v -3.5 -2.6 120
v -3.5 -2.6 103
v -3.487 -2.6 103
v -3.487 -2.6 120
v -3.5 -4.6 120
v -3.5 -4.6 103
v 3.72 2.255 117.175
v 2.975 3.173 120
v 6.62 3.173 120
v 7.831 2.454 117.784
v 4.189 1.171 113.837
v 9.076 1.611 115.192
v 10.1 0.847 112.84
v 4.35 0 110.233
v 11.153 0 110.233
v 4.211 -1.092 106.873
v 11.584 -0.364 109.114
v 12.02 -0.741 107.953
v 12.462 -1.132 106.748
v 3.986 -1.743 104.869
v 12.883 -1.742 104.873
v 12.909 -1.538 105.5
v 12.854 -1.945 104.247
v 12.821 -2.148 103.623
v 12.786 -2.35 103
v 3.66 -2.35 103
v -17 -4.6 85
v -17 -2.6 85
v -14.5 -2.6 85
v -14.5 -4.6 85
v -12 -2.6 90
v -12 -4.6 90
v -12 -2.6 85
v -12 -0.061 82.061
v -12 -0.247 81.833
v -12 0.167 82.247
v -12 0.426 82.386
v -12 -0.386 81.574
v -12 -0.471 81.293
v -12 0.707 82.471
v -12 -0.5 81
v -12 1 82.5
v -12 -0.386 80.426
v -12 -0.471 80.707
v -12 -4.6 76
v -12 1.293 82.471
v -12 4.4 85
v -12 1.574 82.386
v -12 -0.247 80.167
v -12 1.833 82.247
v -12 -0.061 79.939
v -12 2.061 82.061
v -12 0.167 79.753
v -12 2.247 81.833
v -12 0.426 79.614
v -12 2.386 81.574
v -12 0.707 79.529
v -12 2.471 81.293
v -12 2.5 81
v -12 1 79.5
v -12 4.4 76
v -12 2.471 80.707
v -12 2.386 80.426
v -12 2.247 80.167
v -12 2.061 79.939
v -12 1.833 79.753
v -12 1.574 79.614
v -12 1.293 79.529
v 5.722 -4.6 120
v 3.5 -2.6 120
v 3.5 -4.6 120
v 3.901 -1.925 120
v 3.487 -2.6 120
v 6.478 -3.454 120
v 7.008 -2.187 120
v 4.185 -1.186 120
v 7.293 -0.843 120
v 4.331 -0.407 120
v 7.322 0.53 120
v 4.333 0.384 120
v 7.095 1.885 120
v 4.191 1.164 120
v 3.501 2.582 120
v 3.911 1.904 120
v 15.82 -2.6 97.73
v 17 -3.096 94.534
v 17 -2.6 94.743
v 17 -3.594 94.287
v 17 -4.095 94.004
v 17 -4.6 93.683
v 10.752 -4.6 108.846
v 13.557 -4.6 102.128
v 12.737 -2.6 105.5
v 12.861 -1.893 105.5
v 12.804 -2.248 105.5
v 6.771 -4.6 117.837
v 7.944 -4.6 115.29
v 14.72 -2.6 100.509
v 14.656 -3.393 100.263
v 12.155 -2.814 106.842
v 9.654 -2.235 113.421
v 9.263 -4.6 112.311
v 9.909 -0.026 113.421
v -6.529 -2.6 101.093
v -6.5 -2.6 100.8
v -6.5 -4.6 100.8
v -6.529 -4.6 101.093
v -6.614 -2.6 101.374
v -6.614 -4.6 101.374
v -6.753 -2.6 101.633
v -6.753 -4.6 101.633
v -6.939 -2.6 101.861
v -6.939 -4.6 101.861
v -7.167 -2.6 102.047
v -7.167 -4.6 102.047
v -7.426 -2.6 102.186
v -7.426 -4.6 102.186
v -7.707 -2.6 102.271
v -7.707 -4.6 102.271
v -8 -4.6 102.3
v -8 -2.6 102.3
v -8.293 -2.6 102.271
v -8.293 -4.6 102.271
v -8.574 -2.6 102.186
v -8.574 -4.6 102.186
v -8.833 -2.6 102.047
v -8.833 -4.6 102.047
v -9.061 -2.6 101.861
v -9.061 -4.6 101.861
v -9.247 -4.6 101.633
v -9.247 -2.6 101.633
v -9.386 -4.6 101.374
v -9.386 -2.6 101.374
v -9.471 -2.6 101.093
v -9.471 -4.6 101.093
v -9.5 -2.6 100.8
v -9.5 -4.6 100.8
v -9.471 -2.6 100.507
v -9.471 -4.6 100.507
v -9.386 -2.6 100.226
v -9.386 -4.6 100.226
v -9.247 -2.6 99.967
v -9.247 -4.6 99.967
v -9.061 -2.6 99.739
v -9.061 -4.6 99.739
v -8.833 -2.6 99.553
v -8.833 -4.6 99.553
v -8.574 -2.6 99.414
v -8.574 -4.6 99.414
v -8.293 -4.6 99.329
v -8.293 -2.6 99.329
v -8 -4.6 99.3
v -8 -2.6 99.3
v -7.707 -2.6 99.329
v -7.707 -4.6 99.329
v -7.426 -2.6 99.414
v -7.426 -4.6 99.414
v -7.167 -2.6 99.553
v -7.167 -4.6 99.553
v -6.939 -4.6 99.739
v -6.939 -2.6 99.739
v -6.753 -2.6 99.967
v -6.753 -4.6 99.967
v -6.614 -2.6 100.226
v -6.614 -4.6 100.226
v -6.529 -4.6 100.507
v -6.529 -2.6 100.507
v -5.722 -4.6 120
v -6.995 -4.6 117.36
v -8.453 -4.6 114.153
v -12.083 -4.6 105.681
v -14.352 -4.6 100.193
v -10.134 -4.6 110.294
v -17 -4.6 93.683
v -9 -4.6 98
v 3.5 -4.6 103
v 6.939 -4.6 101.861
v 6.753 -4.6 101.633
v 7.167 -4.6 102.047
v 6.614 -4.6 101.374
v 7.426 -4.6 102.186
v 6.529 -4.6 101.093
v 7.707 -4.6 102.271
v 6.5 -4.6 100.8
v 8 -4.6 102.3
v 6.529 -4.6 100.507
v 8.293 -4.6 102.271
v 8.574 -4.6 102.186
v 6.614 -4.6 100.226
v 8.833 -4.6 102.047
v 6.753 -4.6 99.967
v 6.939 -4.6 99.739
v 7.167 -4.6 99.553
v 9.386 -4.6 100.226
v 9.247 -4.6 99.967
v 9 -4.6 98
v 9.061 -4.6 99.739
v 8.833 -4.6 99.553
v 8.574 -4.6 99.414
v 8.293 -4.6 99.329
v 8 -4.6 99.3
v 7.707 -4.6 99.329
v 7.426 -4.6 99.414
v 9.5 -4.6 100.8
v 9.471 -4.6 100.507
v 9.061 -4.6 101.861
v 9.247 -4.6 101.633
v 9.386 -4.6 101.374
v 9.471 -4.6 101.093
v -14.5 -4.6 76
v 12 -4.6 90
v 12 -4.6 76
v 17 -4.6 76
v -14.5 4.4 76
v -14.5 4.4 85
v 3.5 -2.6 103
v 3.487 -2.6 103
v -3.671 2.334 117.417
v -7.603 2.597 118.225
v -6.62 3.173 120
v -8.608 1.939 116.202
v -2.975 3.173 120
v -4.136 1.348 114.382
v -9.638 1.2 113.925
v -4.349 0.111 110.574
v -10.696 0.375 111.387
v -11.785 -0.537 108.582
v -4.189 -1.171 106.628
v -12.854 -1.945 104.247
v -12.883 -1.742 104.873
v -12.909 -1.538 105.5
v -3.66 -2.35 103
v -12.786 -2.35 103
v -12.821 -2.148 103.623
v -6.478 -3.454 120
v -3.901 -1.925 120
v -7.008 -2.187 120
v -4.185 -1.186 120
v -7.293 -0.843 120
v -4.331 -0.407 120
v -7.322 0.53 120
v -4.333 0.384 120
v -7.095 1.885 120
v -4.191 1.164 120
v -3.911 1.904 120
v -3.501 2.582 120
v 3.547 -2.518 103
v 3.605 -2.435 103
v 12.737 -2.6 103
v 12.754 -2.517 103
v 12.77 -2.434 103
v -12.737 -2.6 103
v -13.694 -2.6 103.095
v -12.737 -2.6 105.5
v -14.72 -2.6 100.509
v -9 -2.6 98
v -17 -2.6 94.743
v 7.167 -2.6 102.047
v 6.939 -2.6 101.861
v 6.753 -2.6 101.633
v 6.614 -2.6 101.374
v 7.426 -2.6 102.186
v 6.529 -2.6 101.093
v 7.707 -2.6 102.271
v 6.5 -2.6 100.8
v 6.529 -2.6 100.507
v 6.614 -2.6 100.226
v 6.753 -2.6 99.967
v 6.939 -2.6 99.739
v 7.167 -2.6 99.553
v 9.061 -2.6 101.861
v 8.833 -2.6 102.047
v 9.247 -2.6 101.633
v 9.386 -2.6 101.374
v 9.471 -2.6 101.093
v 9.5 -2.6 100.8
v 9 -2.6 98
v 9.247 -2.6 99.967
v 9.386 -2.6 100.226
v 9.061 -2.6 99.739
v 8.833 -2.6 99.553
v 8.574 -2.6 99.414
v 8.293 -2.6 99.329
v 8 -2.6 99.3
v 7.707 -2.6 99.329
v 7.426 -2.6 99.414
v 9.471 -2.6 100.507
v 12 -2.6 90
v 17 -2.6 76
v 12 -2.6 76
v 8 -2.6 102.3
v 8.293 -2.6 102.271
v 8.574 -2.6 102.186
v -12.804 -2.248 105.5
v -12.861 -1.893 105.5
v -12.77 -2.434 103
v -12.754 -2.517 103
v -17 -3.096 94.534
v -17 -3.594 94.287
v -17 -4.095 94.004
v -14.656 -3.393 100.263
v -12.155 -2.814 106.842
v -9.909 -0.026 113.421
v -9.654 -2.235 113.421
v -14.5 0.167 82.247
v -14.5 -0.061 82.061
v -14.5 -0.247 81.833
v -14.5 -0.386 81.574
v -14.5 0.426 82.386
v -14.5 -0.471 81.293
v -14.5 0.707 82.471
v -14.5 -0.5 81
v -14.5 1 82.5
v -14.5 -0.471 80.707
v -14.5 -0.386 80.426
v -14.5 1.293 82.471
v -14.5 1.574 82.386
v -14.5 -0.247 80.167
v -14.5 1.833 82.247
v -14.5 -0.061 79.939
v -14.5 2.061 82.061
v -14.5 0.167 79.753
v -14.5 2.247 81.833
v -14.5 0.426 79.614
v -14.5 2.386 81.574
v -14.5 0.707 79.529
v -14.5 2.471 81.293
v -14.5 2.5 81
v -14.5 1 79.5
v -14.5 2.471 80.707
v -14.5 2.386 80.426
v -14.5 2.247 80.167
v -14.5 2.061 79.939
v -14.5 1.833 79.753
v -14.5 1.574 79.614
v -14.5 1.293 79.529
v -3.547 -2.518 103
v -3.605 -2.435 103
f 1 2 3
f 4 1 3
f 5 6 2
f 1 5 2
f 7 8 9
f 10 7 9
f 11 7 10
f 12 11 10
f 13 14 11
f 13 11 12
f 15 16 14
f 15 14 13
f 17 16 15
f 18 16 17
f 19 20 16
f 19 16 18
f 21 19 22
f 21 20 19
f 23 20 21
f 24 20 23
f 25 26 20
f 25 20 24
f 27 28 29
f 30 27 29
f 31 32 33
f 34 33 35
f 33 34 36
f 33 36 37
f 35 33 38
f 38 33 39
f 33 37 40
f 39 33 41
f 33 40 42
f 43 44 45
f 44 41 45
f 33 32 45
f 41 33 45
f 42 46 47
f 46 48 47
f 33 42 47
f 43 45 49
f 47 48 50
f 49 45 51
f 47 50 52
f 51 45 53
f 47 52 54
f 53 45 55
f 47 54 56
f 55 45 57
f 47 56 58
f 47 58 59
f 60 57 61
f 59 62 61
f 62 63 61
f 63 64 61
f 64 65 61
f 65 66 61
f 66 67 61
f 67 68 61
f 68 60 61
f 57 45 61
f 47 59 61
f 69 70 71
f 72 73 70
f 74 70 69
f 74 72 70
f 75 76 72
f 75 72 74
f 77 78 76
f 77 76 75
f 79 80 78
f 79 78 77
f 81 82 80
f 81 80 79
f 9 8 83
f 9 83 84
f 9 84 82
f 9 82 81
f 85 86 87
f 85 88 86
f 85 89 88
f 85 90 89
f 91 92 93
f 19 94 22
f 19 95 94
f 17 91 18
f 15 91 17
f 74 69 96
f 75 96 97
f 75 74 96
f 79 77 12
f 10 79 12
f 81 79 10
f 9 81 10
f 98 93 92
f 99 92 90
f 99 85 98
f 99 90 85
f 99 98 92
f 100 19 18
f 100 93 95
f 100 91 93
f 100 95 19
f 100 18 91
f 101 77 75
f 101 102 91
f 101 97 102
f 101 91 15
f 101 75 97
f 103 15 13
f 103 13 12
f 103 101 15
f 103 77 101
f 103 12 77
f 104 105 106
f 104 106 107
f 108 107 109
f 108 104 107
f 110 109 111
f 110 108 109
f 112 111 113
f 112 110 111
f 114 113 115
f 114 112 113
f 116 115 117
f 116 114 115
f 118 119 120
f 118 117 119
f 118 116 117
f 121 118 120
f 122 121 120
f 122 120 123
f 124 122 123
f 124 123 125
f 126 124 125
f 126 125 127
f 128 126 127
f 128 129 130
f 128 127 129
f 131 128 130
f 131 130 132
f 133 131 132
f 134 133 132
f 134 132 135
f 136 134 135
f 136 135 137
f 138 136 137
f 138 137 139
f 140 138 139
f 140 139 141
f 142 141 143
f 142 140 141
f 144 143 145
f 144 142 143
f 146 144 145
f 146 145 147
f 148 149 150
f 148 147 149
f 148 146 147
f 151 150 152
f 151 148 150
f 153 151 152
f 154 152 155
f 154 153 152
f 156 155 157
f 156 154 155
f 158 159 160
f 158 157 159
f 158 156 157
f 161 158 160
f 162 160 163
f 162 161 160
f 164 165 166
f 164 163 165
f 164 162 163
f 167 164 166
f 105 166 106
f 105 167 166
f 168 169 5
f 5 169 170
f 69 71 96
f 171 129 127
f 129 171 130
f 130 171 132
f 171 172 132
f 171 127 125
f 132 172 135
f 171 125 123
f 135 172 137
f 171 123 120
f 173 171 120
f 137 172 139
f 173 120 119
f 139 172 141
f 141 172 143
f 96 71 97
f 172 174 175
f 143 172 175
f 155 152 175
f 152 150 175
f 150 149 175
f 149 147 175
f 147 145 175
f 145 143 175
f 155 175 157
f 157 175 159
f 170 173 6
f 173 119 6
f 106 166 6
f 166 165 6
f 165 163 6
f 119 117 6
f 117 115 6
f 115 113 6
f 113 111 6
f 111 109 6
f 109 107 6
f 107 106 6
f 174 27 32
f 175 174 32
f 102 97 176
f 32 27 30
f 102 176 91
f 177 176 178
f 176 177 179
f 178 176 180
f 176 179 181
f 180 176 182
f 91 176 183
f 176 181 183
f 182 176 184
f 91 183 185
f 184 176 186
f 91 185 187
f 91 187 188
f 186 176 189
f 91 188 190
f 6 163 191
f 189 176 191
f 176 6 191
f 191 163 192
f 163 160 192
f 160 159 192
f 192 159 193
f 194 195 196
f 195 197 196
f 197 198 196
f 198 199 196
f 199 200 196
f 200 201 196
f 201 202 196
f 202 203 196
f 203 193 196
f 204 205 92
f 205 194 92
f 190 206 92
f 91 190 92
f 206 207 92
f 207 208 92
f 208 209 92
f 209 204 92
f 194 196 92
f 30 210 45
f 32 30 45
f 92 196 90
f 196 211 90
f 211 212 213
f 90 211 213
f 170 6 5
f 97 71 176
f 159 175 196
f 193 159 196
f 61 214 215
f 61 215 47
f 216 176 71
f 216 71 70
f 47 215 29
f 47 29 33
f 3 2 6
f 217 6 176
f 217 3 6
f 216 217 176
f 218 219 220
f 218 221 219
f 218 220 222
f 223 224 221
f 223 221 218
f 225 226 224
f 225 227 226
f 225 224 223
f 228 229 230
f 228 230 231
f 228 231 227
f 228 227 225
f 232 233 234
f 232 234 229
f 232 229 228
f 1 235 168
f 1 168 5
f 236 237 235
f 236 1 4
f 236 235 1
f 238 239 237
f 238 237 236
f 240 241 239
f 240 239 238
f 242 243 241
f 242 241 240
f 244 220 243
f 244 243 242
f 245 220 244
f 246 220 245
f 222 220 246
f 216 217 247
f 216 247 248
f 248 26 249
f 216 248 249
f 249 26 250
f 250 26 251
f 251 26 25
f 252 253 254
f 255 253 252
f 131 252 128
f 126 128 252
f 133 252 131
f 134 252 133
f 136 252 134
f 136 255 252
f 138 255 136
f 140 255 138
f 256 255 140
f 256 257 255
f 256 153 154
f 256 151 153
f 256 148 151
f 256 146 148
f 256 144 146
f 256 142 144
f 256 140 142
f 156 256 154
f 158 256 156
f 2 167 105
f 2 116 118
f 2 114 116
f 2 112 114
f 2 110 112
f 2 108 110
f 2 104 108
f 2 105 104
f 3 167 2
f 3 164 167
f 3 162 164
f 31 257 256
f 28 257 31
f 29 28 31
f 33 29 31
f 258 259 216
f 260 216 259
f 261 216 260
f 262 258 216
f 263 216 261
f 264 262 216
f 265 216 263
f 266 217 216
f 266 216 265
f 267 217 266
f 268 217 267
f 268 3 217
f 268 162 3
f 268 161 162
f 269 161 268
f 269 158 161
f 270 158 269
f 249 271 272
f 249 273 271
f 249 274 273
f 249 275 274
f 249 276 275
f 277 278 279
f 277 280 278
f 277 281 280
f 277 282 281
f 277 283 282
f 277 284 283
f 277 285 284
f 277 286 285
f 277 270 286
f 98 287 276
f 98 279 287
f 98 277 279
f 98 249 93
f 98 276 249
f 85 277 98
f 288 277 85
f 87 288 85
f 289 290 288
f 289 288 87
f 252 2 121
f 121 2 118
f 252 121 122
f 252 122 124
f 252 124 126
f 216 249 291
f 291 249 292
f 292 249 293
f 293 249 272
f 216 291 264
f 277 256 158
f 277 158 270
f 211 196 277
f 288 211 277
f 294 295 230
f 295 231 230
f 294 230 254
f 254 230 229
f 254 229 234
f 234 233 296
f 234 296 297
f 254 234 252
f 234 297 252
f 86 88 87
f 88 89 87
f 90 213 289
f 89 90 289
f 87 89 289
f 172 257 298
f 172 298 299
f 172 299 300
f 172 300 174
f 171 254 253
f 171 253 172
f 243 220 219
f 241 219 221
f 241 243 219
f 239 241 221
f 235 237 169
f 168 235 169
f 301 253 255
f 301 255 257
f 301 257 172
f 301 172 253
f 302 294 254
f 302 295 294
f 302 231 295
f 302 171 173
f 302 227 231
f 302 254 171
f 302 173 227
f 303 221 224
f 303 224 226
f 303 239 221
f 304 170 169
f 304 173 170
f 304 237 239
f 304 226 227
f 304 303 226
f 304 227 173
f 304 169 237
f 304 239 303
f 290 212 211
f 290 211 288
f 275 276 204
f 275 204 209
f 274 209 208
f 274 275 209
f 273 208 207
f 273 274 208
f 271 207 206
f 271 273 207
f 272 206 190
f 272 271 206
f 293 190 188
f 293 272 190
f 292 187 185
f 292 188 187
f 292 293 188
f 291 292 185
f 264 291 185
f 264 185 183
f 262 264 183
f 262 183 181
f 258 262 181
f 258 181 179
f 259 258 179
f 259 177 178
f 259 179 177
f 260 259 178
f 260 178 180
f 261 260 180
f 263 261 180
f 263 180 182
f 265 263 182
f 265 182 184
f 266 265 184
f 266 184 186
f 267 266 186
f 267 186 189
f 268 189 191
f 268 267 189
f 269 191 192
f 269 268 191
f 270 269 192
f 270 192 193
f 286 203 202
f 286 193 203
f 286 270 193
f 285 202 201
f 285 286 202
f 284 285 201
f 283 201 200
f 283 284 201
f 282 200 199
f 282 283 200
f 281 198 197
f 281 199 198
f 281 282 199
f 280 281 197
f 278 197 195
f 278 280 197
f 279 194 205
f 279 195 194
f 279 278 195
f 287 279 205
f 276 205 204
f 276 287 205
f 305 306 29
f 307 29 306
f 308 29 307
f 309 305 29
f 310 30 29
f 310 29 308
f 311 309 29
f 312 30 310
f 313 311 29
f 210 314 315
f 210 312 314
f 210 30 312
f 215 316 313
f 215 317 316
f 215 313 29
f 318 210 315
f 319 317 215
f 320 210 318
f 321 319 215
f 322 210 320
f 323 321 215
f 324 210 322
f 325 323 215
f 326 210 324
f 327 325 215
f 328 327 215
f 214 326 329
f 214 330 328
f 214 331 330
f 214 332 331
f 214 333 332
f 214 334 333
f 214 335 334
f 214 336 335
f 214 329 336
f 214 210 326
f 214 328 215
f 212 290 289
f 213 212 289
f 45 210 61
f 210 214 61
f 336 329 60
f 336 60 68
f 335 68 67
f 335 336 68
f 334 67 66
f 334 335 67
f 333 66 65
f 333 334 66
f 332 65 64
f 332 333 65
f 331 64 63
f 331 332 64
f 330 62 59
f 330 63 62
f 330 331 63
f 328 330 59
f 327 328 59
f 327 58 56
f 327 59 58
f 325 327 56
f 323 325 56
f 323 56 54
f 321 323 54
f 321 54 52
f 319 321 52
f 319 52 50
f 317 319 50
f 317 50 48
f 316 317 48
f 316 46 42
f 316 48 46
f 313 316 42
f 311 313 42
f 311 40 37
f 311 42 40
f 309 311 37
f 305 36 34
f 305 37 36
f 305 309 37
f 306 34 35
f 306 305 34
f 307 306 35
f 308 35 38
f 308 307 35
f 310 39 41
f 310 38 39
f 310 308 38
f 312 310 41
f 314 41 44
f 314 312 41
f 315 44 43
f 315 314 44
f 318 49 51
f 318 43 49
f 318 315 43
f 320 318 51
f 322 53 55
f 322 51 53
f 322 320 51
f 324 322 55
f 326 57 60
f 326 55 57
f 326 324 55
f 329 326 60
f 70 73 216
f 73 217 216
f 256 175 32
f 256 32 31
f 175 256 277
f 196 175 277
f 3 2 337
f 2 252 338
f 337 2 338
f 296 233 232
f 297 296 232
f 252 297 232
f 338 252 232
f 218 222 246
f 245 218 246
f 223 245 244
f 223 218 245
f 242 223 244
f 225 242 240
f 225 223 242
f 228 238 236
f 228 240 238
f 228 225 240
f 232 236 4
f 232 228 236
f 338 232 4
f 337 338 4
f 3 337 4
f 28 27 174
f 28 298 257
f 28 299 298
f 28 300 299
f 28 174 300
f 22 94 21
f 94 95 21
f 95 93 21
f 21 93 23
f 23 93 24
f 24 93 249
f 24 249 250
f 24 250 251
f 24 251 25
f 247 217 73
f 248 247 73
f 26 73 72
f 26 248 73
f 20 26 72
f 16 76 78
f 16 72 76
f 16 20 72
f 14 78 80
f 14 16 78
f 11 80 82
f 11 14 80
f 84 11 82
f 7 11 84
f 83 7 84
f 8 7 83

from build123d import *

# Parameters (mm, degrees)
CYLINDER399_R          = 21
CYLINDER399_DEPTH      = 9
BOX330_W               = 26
BOX330_H               = 12
BOX330_DEPTH           = 20
BOX331_W               = 26
BOX331_H               = 15
BOX331_DEPTH           = 25
BOX331_PLACEMENT_ANGLE = 18
CYLINDER407_R          = 4.35
CYLINDER407_DEPTH      = 17
CYLINDER406_R          = 13
CYLINDER406_DEPTH      = 17
CYLINDER403_R          = 1.5
CYLINDER403_DEPTH      = 10
BOX329_W               = 2.5
BOX329_H               = 9
BOX329_DEPTH           = 9
BOX317_W               = 7
BOX317_H               = 2
BOX317_DEPTH           = 17
CYLINDER401_R          = 1.5
CYLINDER401_DEPTH      = 5
CYLINDER397_R          = 1.5
CYLINDER397_DEPTH      = 5
BOX316_W               = 3
BOX316_H               = 2
BOX316_DEPTH           = 9
BOX322_W               = 24
BOX322_H               = 6
BOX322_DEPTH           = 22
CHAMFER_1_SIZE2        = 3
CHAMFER_1_SIZE         = 8
CHAMFER_2_SIZE2        = 3
CHAMFER_2_SIZE         = 8
BOX324_W               = 34
BOX324_H               = 2
BOX324_DEPTH           = 44


with BuildPart() as cone005:
    # Cone004 → Cone004 (revolve)
    with BuildSketch(Plane(origin=(0, 0, 85), x_dir=(1, 0, 0), z_dir=(0, -1, 0))):
        Polygon((0, 0), (21, 0), (5, 41), (0, 41), align=None)
    revolve(axis=Axis((0, 0, 85), (0, 0, 1)))


with BuildPart() as fusion077:
    # Cylinder399 → Cylinder399 (new body)
    with BuildSketch(Plane.XY.offset(76)):
        Circle(CYLINDER399_R)
    extrude(amount=CYLINDER399_DEPTH)

    # Fusion077: union Cone005
    add(cone005.part)


with BuildPart() as cube306:
    # Box330 → Box330 (new body)
    with BuildSketch(Plane(origin=(-13, -14.6, 101), x_dir=(1, 0, 0), z_dir=(0, 0, 1))):
        with Locations((13, 6)):
            Rectangle(BOX330_W, BOX330_H)
    extrude(amount=BOX330_DEPTH)


with BuildPart() as cube307:
    # Box331 → Box331 (new body)
    with BuildSketch(Plane.XY):
        with Locations((13, 7.5)):
            Rectangle(BOX331_W, BOX331_H)
    extrude(amount=BOX331_DEPTH)


with BuildPart() as cube307_1:
    # Box331 placement: moved
    add(cube307.part.moved(Location((-13, -3, 101))).rotate(Axis((-13, -3, 101), (-1, 0, 0)), BOX331_PLACEMENT_ANGLE))


with BuildPart() as cylinder407:
    # Cylinder407 → Cylinder407 (new body)
    with BuildSketch(Plane.XY.offset(103)):
        Circle(CYLINDER407_R)
    extrude(amount=CYLINDER407_DEPTH)


with BuildPart() as antenna_support_carrier:
    # Cylinder406 → Cylinder406 (new body)
    with BuildSketch(Plane.XY.offset(103)):
        Circle(CYLINDER406_R)
    extrude(amount=CYLINDER406_DEPTH)

    # Cut220: cut Cylinder407
    add(cylinder407.part, mode=Mode.SUBTRACT)

    # Cut221: cut Cube307
    add(cube307_1.part, mode=Mode.SUBTRACT)

    # Cut216: cut Cube306
    add(cube306.part, mode=Mode.SUBTRACT)


with BuildPart() as cylinder403:
    # Cylinder403 → Cylinder403 (new body)
    with BuildSketch(Plane(origin=(-20, 1, 72), x_dir=(0, 0, -1), z_dir=(1, 0, 0))):
        Circle(CYLINDER403_R)
    extrude(amount=CYLINDER403_DEPTH)


with BuildPart() as cut223:
    # Box329 → Box329 (new body)
    with BuildSketch(Plane(origin=(-14.5, -4.6, 67), x_dir=(1, 0, 0), z_dir=(0, 0, 1))):
        with Locations((1.25, 4.5)):
            Rectangle(BOX329_W, BOX329_H)
    extrude(amount=BOX329_DEPTH)

    # Cut223: cut Cylinder403
    add(cylinder403.part, mode=Mode.SUBTRACT)


with BuildPart() as cut223_1:
    # Cut223 placement: moved
    add(cut223.part.moved(Location((0, 0, 9))))


with BuildPart() as cube293:
    # Box317 → Box317 (new body)
    with BuildSketch(Plane(origin=(-3.5, -4.6, 103), x_dir=(1, 0, 0), z_dir=(0, 0, 1))):
        with Locations((3.5, 1)):
            Rectangle(BOX317_W, BOX317_H)
    extrude(amount=BOX317_DEPTH)


with BuildPart() as cylinder401:
    # Cylinder401 → Cylinder401 (new body)
    with BuildSketch(Plane(origin=(-8, 0, 100.8), x_dir=(1, 0, 0), z_dir=(0, -1, 0))):
        Circle(CYLINDER401_R)
    extrude(amount=CYLINDER401_DEPTH)


with BuildPart() as screwholes002:
    # Cylinder397 → Cylinder397 (new body)
    with BuildSketch(Plane(origin=(8, 0, 100.8), x_dir=(1, 0, 0), z_dir=(0, -1, 0))):
        Circle(CYLINDER397_R)
    extrude(amount=CYLINDER397_DEPTH)

    # Compound200: union Cylinder401
    add(cylinder401.part)


with BuildPart() as cube292:
    # Box316 → Box316 (new body)
    with BuildSketch(Plane(origin=(-17.5, -4.6, 76), x_dir=(1, 0, 0), z_dir=(0, 0, 1))):
        with Locations((1.5, 1)):
            Rectangle(BOX316_W, BOX316_H)
    extrude(amount=BOX316_DEPTH)


with BuildPart() as cut_outs001:
    # Box322 → Box322 (new body)
    with BuildSketch(Plane(origin=(-12, -4.6, 76), x_dir=(1, 0, 0), z_dir=(0, 0, 1))):
        with Locations((12, 3)):
            Rectangle(BOX322_W, BOX322_H)
    extrude(amount=BOX322_DEPTH)

    # Chamfer 1
    chamfer_1_edges = [cut_outs001.edges().sort_by_distance(p)[0] for p in [
        (12, -1.6, 98),
    ]]
    chamfer_1_side = cut_outs001.faces().sort_by_distance((12, -1.6, 87))[0]
    chamfer(chamfer_1_edges, length=CHAMFER_1_SIZE, length2=CHAMFER_1_SIZE2, reference=chamfer_1_side)

    # Chamfer 2
    chamfer_2_edges = [cut_outs001.edges().sort_by_distance(p)[0] for p in [
        (-12, -1.6, 98),
    ]]
    chamfer_2_side = cut_outs001.faces().sort_by_distance((-12, -1.6, 87))[0]
    chamfer(chamfer_2_edges, length=CHAMFER_2_SIZE, length2=CHAMFER_2_SIZE2, reference=chamfer_2_side)

    # Fusion085: union Cube293, Screwholes002, Cube292
    add(cube293.part)
    add(screwholes002.part)
    add(cube292.part)


with BuildPart() as support_mpu6050:
    # Box324 → Box324 (new body)
    with BuildSketch(Plane(origin=(-17, -4.6, 76), x_dir=(1, 0, 0), z_dir=(0, 0, 1))):
        with Locations((17, 1)):
            Rectangle(BOX324_W, BOX324_H)
    extrude(amount=BOX324_DEPTH)

    # Cut225: cut cut-outs001
    add(cut_outs001.part, mode=Mode.SUBTRACT)

    # Fusion086: union Antenna support carrier, Cut223
    add(antenna_support_carrier.part)
    add(cut223_1.part)

    # Common006: intersect Fusion077
    add(fusion077.part, mode=Mode.INTERSECT)


solid = support_mpu6050.part
